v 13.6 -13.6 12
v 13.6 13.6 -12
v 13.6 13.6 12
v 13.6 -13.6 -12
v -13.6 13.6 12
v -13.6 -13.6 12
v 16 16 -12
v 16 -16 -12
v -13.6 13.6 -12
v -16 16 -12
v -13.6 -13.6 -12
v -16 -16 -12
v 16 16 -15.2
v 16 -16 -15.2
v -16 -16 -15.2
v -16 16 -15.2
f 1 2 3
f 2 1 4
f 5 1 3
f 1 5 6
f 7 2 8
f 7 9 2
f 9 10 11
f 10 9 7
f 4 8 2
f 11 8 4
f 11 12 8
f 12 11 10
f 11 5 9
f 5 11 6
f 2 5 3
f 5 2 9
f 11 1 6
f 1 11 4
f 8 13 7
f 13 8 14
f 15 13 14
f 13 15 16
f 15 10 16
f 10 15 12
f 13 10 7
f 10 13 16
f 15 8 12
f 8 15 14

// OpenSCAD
size = 32;//block=32 //item=8

cube([size * 0.85, size * 0.85, size * 0.75], center = true);
translate([0, 0, -(((size * 0.75) / 2) + ((size * 0.1) / 2))]) {
  cube([size * 1, size * 1, size * 0.1], center = true);
}
;//translate
